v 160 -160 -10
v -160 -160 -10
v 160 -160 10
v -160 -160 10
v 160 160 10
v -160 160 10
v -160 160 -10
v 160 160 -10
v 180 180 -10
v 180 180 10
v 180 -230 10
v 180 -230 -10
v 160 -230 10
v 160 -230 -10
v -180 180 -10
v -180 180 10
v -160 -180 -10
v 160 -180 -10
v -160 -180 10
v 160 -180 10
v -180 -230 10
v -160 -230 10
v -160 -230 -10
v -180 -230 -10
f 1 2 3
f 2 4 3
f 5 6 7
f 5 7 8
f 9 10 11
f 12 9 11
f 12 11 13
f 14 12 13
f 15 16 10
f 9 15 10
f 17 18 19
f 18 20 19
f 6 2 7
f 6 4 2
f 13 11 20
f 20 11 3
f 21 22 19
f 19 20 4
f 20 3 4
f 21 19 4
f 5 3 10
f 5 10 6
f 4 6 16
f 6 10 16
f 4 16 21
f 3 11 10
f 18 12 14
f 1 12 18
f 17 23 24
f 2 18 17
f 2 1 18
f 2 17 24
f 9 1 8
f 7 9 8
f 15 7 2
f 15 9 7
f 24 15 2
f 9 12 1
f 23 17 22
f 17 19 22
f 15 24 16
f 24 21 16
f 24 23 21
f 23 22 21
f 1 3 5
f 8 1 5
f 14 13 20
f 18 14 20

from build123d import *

# Parameters (mm, degrees)
SKETCH2_W           = 320
SKETCH2_H           = 320
BOSS_EXTRUDE1_DEPTH = 10


with BuildPart() as part:
    # Sketch2 → Boss-Extrude1 (new, symmetric)
    with BuildSketch(Plane.XY):
        Polygon((160, -230), (160, -180), (-160, -180), (-160, -230), (-180, -230), (-180, 180), (180, 180), (180, -230), align=None)
        Rectangle(SKETCH2_W, SKETCH2_H, mode=Mode.SUBTRACT)
    extrude(amount=BOSS_EXTRUDE1_DEPTH, both=True)


solid = part.part
